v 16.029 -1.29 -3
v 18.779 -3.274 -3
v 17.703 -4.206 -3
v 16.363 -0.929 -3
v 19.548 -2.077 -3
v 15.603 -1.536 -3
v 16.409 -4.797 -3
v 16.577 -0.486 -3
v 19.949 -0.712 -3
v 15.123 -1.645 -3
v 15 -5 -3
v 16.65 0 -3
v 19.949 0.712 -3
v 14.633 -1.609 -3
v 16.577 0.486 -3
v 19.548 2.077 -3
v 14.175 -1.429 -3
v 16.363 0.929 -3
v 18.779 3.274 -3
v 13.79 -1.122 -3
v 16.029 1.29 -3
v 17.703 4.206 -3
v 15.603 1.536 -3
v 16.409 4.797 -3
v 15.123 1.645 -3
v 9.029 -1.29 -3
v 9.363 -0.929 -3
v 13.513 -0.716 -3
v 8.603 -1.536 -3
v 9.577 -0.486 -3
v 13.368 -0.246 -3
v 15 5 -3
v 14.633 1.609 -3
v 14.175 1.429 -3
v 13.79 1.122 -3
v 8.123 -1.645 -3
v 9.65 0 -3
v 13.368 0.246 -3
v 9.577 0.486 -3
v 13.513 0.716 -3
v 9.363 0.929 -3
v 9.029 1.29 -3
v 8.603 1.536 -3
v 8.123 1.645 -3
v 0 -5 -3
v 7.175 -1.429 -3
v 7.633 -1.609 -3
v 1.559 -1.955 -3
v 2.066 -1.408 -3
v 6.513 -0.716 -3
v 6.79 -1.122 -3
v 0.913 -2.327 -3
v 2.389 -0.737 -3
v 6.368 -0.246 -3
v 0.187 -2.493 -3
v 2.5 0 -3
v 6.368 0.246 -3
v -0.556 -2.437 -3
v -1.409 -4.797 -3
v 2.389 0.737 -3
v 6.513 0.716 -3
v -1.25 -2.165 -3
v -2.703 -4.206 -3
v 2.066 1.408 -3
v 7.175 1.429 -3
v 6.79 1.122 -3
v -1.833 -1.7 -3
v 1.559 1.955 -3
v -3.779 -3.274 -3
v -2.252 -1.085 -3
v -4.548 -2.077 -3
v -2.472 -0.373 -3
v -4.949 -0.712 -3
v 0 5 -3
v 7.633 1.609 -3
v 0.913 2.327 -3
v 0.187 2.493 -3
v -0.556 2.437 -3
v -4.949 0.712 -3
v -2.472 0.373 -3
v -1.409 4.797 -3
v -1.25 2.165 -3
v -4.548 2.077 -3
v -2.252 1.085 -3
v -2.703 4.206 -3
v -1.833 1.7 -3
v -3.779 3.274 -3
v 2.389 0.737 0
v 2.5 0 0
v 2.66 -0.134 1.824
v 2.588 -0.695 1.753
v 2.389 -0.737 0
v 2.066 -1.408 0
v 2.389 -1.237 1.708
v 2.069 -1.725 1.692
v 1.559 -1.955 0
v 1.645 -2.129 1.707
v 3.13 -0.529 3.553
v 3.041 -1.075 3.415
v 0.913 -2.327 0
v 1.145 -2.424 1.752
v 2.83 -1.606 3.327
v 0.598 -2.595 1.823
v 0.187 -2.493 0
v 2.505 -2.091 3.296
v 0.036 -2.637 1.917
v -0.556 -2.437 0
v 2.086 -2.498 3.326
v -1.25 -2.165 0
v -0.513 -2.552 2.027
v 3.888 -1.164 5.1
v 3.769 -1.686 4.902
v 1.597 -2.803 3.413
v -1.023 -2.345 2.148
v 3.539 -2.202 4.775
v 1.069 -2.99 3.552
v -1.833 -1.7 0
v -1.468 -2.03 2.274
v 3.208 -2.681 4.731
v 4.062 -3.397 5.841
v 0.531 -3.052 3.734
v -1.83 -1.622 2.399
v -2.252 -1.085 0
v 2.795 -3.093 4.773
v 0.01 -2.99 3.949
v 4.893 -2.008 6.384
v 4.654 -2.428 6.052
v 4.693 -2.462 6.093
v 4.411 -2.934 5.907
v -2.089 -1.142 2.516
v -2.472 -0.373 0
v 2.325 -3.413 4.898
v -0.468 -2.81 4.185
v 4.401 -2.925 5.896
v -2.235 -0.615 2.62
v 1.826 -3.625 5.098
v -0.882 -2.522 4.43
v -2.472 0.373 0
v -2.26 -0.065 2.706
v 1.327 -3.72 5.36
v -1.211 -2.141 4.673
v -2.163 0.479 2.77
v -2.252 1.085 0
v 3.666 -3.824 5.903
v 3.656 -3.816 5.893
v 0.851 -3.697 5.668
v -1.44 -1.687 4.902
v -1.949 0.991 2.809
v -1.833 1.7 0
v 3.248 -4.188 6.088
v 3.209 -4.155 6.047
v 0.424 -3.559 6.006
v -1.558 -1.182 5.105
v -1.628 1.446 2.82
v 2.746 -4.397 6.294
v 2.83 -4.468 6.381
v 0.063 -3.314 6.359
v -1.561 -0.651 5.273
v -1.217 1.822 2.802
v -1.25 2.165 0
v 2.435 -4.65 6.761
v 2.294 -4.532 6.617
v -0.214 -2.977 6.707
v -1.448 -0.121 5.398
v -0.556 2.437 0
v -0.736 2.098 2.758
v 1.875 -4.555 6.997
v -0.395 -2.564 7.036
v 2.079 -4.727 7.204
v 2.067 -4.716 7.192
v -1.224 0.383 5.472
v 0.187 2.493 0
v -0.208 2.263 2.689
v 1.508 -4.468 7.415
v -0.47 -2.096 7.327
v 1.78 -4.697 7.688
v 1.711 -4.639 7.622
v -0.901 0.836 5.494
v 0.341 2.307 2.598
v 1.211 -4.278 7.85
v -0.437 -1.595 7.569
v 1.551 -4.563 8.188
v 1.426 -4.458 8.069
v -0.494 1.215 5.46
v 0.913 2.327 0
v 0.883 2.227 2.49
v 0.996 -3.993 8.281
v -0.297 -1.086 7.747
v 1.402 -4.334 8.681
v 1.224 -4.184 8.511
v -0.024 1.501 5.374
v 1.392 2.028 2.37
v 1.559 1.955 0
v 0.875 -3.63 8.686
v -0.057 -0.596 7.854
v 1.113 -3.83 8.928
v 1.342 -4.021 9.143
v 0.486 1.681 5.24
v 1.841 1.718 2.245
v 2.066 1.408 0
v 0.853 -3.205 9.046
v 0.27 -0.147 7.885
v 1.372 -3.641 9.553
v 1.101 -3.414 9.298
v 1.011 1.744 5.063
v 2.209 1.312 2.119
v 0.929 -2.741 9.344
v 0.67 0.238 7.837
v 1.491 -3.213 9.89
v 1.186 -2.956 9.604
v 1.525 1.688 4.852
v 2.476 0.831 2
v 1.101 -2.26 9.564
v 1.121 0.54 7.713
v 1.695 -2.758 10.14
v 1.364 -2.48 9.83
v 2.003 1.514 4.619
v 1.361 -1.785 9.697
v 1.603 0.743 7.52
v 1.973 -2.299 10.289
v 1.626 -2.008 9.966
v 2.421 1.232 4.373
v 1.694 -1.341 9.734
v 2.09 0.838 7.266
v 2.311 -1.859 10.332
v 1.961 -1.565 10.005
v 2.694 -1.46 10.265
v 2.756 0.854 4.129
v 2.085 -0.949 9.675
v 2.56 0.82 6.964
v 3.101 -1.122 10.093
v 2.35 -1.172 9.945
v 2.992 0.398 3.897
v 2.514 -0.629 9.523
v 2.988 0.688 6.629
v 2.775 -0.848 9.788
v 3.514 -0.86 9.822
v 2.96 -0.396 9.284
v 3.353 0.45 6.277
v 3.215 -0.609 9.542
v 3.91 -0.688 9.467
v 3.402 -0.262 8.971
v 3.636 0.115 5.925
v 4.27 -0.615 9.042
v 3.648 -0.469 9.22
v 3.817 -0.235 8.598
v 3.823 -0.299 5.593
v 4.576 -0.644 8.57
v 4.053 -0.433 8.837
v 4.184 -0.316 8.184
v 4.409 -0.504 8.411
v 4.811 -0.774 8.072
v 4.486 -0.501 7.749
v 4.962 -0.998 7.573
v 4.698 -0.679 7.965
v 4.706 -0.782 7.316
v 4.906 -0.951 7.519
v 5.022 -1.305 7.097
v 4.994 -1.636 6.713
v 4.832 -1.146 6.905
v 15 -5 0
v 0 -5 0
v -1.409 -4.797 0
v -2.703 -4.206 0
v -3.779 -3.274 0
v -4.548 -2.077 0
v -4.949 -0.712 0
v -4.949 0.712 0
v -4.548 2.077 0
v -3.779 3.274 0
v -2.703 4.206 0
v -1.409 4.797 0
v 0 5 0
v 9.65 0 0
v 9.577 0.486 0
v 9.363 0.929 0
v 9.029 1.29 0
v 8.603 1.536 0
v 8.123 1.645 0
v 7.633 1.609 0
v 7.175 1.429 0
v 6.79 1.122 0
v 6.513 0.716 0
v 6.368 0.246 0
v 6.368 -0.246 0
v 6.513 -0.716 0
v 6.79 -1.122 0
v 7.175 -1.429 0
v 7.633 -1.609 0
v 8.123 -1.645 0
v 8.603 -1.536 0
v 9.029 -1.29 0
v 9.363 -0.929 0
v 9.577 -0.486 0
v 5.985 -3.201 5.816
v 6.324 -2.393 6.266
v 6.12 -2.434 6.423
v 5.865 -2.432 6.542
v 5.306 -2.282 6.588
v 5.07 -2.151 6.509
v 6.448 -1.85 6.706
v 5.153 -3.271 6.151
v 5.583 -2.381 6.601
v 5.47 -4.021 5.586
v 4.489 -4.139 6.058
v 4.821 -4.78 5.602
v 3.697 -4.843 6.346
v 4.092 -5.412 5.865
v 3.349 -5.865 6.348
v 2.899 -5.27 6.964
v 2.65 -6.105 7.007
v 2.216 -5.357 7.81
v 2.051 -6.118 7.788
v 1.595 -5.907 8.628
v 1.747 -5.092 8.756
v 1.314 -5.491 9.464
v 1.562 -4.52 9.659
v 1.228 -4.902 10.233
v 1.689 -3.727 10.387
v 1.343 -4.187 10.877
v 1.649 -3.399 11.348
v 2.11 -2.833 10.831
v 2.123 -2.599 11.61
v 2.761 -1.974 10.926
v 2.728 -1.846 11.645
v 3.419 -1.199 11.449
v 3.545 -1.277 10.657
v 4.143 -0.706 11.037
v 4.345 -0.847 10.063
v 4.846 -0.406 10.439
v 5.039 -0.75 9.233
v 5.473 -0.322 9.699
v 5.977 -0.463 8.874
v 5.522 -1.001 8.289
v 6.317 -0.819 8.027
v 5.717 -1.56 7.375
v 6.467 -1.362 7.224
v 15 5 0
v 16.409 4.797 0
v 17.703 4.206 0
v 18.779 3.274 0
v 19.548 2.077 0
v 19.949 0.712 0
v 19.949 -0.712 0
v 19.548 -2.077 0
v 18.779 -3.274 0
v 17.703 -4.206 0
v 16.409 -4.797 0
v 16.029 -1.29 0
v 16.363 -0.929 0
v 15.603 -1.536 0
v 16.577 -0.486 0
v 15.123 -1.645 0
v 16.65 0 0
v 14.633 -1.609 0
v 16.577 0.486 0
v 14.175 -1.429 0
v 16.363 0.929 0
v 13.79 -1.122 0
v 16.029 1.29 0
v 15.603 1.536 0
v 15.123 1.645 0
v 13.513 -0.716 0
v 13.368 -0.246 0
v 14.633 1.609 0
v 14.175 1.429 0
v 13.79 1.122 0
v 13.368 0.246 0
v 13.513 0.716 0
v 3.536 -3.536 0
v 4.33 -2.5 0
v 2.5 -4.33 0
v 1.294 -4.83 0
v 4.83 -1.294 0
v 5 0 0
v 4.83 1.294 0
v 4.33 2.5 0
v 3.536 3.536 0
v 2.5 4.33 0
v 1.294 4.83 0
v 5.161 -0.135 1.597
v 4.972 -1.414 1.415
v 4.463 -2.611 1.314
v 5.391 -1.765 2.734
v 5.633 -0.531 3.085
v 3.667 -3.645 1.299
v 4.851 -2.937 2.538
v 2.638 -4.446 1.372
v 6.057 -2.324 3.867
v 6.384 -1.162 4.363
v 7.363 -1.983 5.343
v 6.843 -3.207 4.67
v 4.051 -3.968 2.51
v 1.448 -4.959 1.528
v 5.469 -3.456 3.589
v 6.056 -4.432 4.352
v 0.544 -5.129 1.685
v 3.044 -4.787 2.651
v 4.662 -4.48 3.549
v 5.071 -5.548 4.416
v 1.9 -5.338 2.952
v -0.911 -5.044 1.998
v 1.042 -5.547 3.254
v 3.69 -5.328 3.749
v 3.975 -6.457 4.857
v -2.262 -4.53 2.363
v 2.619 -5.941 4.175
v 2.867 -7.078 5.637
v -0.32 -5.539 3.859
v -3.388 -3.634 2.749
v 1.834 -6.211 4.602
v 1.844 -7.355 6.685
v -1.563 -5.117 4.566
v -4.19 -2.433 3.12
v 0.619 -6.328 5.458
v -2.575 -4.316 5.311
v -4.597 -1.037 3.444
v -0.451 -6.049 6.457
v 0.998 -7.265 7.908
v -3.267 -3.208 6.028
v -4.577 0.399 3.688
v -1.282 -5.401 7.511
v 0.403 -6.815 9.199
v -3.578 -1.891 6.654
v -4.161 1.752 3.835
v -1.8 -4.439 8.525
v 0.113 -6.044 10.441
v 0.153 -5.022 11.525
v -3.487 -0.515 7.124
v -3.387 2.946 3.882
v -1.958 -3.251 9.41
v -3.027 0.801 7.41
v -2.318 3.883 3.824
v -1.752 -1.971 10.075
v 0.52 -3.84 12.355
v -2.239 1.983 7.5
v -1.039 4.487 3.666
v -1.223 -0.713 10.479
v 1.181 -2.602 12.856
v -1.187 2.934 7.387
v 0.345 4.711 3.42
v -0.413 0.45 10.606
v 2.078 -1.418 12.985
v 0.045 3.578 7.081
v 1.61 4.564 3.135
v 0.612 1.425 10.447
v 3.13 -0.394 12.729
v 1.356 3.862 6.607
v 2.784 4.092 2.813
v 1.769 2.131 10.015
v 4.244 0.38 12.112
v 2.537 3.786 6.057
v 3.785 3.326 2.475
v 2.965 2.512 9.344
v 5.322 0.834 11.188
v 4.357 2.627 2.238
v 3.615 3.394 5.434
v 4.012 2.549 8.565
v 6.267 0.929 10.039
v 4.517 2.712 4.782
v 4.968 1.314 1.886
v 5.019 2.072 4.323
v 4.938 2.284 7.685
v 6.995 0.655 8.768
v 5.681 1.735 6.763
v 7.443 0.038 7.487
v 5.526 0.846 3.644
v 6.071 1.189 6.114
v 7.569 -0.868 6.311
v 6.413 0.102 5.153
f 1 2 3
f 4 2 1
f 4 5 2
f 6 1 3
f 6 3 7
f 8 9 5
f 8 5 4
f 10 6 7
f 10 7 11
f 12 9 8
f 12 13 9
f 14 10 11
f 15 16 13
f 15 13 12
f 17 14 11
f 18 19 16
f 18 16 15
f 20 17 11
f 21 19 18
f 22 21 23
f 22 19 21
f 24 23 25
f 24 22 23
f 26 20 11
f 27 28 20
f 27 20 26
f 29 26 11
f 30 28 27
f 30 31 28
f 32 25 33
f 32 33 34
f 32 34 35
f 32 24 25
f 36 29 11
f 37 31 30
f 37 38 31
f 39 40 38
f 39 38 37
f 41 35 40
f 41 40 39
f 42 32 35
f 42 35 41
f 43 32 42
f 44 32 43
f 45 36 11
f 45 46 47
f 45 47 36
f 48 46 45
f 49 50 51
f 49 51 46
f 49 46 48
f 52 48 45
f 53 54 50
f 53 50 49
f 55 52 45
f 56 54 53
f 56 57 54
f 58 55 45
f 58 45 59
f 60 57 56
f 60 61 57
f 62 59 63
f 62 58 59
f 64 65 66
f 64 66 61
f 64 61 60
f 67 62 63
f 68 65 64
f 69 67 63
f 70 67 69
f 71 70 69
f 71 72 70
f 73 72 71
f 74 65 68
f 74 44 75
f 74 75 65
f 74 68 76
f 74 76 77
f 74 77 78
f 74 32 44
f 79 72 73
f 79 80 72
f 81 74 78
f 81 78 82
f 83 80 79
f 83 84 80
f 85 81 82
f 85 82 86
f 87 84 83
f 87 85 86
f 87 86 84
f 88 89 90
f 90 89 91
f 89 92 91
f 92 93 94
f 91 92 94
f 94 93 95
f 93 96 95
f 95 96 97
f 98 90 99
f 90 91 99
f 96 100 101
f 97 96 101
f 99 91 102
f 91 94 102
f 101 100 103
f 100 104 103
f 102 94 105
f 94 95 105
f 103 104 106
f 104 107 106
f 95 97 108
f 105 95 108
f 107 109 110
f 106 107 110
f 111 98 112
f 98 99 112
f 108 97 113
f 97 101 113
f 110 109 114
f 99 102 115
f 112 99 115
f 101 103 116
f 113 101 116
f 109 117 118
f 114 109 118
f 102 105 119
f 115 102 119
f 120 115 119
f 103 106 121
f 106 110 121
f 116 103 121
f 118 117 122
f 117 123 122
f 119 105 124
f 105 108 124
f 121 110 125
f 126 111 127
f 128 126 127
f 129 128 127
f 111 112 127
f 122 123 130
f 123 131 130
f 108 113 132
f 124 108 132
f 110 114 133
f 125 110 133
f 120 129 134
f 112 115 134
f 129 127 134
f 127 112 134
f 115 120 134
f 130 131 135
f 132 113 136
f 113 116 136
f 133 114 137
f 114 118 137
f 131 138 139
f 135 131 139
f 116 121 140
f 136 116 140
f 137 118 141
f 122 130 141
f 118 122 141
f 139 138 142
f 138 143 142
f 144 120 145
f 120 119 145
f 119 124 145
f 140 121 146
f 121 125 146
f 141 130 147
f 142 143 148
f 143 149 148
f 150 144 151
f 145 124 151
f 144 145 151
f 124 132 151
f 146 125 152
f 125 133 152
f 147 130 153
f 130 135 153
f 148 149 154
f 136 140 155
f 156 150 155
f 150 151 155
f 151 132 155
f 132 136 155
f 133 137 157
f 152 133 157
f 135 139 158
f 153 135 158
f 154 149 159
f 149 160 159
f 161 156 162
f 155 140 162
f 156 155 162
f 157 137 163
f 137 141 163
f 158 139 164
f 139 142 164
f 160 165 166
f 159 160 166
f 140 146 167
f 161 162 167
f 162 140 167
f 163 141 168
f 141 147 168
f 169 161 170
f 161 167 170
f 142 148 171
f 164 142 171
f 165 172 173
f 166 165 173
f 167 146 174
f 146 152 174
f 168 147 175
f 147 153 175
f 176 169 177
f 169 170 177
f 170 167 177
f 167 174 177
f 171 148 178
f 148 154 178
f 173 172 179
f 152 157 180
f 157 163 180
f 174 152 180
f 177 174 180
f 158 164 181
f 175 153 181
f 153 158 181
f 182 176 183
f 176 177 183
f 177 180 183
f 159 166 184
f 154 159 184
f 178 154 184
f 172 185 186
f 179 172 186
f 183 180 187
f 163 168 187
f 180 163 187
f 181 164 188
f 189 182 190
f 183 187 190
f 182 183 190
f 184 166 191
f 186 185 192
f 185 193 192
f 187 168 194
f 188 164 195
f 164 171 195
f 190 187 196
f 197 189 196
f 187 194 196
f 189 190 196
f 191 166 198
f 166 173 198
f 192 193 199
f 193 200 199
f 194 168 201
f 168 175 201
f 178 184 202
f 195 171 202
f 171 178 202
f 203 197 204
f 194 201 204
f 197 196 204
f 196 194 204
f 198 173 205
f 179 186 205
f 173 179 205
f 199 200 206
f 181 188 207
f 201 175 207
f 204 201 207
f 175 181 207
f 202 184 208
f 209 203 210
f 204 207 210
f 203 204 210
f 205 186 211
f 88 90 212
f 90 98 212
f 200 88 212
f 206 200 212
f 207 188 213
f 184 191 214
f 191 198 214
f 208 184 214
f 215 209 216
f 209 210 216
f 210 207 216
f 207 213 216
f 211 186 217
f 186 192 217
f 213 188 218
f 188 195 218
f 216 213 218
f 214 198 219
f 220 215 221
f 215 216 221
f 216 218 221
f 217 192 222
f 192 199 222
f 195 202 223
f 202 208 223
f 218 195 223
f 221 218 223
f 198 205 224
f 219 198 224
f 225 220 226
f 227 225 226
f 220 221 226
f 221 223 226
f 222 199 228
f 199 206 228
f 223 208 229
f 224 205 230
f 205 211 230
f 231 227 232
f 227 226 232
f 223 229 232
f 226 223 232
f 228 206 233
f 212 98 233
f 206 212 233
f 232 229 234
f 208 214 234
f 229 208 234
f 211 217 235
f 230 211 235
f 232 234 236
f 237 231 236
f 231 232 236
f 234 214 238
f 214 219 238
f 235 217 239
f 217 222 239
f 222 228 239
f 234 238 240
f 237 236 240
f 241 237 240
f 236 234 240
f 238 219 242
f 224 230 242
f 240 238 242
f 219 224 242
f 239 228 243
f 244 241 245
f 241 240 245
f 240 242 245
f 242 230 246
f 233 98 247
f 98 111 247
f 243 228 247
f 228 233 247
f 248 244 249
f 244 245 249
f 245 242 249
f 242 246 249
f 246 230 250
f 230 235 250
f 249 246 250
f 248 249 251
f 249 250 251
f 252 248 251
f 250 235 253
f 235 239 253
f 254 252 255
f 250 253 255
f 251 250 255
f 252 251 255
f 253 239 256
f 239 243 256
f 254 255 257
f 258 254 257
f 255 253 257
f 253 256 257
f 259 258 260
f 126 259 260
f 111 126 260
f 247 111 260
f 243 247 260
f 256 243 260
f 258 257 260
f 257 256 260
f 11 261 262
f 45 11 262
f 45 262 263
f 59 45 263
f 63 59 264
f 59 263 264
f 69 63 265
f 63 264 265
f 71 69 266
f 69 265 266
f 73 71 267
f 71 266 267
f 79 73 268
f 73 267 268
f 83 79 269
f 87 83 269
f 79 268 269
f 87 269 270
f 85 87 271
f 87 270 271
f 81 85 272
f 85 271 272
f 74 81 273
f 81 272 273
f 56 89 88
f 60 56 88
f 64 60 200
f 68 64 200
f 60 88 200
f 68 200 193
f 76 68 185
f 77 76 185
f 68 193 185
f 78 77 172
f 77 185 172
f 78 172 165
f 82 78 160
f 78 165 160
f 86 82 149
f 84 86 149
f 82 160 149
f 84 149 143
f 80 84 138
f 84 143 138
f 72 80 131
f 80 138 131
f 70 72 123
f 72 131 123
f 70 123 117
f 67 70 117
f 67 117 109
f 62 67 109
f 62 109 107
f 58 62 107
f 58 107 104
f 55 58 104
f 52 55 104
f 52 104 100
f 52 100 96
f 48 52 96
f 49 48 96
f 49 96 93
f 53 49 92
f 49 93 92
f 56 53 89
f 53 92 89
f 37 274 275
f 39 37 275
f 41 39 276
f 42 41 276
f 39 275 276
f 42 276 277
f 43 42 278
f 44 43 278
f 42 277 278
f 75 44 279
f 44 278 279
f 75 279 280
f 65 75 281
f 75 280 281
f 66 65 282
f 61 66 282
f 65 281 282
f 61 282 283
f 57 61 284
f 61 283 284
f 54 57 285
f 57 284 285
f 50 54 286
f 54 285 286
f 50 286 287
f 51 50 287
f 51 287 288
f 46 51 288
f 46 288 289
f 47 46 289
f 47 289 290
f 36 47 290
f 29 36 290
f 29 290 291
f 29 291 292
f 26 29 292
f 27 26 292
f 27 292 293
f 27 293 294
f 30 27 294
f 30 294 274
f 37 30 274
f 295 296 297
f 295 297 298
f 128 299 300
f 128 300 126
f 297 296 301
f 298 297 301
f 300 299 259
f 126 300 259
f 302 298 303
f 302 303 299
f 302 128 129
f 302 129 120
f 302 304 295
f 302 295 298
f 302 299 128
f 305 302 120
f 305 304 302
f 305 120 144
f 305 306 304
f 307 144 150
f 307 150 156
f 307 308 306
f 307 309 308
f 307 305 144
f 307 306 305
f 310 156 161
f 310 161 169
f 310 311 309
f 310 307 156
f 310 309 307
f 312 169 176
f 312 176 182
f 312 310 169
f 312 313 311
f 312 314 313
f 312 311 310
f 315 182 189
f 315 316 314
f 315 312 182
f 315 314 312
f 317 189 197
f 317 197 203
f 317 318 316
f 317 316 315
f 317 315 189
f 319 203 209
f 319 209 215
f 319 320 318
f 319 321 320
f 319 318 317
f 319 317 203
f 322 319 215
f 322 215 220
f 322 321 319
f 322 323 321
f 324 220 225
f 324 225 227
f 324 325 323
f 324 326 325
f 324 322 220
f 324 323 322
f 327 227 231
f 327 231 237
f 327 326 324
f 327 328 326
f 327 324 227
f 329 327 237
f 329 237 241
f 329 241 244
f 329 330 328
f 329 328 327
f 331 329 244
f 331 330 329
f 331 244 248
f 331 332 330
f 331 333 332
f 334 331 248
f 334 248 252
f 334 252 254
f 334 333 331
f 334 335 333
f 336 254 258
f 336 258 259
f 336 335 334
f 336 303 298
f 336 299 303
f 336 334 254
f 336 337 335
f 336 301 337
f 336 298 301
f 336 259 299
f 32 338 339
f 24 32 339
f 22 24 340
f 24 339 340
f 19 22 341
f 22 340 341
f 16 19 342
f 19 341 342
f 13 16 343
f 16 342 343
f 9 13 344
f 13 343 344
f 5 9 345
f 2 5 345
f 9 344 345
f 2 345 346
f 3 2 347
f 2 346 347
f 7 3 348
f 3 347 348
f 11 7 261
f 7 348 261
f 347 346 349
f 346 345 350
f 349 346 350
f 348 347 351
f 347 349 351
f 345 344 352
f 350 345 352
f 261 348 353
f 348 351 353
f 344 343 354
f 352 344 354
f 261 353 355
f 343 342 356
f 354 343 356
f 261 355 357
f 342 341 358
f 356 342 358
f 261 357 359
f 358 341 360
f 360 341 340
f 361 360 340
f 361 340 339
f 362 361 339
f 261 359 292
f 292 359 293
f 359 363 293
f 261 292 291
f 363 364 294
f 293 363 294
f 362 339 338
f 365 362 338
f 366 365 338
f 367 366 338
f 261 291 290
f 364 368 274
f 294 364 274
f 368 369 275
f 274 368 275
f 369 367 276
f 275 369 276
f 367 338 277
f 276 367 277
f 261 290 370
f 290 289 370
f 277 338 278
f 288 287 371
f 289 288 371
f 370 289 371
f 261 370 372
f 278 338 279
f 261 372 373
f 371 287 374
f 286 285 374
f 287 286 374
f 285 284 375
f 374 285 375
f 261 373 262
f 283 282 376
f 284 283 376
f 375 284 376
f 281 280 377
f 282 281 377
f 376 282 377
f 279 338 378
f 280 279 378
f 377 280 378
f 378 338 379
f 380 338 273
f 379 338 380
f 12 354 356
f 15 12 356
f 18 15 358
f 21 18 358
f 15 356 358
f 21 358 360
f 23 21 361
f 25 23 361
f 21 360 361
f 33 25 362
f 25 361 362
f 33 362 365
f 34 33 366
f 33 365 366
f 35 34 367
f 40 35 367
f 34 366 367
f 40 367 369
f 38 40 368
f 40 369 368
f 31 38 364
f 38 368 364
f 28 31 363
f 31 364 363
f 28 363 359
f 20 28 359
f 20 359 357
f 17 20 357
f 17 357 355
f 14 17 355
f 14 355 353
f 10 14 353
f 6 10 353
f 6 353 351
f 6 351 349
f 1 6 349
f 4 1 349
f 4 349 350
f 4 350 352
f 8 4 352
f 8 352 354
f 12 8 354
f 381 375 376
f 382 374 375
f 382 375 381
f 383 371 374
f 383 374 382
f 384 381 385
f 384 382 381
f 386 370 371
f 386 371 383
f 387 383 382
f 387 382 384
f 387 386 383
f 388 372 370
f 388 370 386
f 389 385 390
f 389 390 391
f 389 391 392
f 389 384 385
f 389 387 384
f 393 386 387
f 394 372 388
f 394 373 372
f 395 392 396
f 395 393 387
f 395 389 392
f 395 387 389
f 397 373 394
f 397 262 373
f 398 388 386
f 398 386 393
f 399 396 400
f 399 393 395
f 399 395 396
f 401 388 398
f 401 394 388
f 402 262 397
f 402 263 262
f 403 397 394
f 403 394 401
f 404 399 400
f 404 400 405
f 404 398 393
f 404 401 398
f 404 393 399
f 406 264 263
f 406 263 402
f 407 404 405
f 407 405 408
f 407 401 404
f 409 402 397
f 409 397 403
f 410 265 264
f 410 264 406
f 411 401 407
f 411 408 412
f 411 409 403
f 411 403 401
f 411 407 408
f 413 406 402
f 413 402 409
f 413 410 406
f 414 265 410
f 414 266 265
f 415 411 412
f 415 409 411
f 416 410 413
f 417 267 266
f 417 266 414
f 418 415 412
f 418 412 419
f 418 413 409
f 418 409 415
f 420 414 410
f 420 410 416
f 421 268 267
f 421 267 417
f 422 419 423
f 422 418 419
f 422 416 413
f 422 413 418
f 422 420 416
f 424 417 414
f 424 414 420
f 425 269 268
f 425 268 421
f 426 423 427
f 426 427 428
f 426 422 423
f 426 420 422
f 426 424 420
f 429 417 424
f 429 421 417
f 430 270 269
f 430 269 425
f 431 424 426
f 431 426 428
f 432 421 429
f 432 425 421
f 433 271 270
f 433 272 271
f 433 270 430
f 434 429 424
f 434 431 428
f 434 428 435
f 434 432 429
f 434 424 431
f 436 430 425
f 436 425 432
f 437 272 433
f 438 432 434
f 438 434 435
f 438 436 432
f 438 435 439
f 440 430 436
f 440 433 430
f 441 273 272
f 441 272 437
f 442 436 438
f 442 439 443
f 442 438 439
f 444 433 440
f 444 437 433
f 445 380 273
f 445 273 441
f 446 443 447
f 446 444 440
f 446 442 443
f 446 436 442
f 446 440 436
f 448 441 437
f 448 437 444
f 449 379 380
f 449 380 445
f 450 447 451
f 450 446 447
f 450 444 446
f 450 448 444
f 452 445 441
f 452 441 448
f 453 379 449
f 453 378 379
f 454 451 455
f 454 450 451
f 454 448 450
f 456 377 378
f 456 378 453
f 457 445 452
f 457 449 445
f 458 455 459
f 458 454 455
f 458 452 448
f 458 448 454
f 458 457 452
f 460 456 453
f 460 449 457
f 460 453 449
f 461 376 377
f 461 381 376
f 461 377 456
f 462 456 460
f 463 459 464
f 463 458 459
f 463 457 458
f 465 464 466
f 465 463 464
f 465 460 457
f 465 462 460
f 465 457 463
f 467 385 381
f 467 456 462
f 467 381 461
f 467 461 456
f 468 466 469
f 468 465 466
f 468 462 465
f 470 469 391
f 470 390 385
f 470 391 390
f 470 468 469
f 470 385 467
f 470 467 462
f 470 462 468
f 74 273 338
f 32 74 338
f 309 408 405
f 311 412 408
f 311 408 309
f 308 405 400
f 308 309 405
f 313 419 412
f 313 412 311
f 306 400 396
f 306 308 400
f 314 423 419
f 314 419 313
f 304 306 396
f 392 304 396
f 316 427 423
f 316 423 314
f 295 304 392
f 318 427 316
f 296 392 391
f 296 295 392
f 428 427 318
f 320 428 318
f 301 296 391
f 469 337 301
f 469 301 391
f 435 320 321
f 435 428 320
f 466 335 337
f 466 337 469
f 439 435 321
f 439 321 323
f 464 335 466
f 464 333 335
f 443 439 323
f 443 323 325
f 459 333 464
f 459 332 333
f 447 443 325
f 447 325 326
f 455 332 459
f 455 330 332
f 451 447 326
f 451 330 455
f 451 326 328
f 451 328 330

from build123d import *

# Parameters (mm, degrees)
SKETCH_1_R          = 2.5
EXTRUDE_1_DEPTH     = 3
SKETCH_4_R          = 5
SKETCH_4_R_2        = 2.5
SKETCH_5_R          = 1.65
CUT_EXTRUDE_1_DEPTH = 25.960601113
FILLET_1_R          = 1


with BuildPart() as part:
    # ｽｹｯﾁ1 → ﾎﾞｽ - 押し出し1 (new body)
    with BuildSketch(Plane.XY):
        with BuildLine():
            Line((0, 5), (15, 5))
            ThreePointArc((15, 5), (20, 0), (15, -5))
            Line((15, -5), (0, -5))
            ThreePointArc((0, -5), (-5, 0), (0, 5))
        make_face()
        Circle(SKETCH_1_R, mode=Mode.SUBTRACT)
    extrude(amount=-EXTRUDE_1_DEPTH)

    # ｽｲｰﾌﾟ1: sweep along a path in ｽｹｯﾁ6
    with BuildLine(Plane(origin=(0, 0, 0), x_dir=(0, 0, 1), z_dir=(0.6427876096865379, 0.7660444431189792, 0))) as sweep_1_path:
        ThreePointArc((0, 0), (5, 1.339745962), (8.660254038, 5))
    # ｽｹｯﾁ4 → ｽｲｰﾌﾟ1 (sweep)
    with BuildSketch(Plane.XY):
        Circle(SKETCH_4_R)
        Circle(SKETCH_4_R_2, mode=Mode.SUBTRACT)
    sweep(path=sweep_1_path.line)

    # ｽｹｯﾁ5 → ｶｯﾄ - 押し出し1 (cut, through all)
    with BuildSketch(Plane.XY):
        with Locations((8, 0)):
            Circle(SKETCH_5_R)
        with Locations((15, 0)):
            Circle(SKETCH_5_R)
    extrude(amount=-CUT_EXTRUDE_1_DEPTH, mode=Mode.SUBTRACT)

    # ﾌｨﾚｯﾄ1
    fillet_1_edges = [part.edges().sort_by_distance(p)[0] for p in [
        (2.063752327, -3.829442894, 10.318788908),
    ]]
    fillet(fillet_1_edges, radius=FILLET_1_R)


solid = part.part
